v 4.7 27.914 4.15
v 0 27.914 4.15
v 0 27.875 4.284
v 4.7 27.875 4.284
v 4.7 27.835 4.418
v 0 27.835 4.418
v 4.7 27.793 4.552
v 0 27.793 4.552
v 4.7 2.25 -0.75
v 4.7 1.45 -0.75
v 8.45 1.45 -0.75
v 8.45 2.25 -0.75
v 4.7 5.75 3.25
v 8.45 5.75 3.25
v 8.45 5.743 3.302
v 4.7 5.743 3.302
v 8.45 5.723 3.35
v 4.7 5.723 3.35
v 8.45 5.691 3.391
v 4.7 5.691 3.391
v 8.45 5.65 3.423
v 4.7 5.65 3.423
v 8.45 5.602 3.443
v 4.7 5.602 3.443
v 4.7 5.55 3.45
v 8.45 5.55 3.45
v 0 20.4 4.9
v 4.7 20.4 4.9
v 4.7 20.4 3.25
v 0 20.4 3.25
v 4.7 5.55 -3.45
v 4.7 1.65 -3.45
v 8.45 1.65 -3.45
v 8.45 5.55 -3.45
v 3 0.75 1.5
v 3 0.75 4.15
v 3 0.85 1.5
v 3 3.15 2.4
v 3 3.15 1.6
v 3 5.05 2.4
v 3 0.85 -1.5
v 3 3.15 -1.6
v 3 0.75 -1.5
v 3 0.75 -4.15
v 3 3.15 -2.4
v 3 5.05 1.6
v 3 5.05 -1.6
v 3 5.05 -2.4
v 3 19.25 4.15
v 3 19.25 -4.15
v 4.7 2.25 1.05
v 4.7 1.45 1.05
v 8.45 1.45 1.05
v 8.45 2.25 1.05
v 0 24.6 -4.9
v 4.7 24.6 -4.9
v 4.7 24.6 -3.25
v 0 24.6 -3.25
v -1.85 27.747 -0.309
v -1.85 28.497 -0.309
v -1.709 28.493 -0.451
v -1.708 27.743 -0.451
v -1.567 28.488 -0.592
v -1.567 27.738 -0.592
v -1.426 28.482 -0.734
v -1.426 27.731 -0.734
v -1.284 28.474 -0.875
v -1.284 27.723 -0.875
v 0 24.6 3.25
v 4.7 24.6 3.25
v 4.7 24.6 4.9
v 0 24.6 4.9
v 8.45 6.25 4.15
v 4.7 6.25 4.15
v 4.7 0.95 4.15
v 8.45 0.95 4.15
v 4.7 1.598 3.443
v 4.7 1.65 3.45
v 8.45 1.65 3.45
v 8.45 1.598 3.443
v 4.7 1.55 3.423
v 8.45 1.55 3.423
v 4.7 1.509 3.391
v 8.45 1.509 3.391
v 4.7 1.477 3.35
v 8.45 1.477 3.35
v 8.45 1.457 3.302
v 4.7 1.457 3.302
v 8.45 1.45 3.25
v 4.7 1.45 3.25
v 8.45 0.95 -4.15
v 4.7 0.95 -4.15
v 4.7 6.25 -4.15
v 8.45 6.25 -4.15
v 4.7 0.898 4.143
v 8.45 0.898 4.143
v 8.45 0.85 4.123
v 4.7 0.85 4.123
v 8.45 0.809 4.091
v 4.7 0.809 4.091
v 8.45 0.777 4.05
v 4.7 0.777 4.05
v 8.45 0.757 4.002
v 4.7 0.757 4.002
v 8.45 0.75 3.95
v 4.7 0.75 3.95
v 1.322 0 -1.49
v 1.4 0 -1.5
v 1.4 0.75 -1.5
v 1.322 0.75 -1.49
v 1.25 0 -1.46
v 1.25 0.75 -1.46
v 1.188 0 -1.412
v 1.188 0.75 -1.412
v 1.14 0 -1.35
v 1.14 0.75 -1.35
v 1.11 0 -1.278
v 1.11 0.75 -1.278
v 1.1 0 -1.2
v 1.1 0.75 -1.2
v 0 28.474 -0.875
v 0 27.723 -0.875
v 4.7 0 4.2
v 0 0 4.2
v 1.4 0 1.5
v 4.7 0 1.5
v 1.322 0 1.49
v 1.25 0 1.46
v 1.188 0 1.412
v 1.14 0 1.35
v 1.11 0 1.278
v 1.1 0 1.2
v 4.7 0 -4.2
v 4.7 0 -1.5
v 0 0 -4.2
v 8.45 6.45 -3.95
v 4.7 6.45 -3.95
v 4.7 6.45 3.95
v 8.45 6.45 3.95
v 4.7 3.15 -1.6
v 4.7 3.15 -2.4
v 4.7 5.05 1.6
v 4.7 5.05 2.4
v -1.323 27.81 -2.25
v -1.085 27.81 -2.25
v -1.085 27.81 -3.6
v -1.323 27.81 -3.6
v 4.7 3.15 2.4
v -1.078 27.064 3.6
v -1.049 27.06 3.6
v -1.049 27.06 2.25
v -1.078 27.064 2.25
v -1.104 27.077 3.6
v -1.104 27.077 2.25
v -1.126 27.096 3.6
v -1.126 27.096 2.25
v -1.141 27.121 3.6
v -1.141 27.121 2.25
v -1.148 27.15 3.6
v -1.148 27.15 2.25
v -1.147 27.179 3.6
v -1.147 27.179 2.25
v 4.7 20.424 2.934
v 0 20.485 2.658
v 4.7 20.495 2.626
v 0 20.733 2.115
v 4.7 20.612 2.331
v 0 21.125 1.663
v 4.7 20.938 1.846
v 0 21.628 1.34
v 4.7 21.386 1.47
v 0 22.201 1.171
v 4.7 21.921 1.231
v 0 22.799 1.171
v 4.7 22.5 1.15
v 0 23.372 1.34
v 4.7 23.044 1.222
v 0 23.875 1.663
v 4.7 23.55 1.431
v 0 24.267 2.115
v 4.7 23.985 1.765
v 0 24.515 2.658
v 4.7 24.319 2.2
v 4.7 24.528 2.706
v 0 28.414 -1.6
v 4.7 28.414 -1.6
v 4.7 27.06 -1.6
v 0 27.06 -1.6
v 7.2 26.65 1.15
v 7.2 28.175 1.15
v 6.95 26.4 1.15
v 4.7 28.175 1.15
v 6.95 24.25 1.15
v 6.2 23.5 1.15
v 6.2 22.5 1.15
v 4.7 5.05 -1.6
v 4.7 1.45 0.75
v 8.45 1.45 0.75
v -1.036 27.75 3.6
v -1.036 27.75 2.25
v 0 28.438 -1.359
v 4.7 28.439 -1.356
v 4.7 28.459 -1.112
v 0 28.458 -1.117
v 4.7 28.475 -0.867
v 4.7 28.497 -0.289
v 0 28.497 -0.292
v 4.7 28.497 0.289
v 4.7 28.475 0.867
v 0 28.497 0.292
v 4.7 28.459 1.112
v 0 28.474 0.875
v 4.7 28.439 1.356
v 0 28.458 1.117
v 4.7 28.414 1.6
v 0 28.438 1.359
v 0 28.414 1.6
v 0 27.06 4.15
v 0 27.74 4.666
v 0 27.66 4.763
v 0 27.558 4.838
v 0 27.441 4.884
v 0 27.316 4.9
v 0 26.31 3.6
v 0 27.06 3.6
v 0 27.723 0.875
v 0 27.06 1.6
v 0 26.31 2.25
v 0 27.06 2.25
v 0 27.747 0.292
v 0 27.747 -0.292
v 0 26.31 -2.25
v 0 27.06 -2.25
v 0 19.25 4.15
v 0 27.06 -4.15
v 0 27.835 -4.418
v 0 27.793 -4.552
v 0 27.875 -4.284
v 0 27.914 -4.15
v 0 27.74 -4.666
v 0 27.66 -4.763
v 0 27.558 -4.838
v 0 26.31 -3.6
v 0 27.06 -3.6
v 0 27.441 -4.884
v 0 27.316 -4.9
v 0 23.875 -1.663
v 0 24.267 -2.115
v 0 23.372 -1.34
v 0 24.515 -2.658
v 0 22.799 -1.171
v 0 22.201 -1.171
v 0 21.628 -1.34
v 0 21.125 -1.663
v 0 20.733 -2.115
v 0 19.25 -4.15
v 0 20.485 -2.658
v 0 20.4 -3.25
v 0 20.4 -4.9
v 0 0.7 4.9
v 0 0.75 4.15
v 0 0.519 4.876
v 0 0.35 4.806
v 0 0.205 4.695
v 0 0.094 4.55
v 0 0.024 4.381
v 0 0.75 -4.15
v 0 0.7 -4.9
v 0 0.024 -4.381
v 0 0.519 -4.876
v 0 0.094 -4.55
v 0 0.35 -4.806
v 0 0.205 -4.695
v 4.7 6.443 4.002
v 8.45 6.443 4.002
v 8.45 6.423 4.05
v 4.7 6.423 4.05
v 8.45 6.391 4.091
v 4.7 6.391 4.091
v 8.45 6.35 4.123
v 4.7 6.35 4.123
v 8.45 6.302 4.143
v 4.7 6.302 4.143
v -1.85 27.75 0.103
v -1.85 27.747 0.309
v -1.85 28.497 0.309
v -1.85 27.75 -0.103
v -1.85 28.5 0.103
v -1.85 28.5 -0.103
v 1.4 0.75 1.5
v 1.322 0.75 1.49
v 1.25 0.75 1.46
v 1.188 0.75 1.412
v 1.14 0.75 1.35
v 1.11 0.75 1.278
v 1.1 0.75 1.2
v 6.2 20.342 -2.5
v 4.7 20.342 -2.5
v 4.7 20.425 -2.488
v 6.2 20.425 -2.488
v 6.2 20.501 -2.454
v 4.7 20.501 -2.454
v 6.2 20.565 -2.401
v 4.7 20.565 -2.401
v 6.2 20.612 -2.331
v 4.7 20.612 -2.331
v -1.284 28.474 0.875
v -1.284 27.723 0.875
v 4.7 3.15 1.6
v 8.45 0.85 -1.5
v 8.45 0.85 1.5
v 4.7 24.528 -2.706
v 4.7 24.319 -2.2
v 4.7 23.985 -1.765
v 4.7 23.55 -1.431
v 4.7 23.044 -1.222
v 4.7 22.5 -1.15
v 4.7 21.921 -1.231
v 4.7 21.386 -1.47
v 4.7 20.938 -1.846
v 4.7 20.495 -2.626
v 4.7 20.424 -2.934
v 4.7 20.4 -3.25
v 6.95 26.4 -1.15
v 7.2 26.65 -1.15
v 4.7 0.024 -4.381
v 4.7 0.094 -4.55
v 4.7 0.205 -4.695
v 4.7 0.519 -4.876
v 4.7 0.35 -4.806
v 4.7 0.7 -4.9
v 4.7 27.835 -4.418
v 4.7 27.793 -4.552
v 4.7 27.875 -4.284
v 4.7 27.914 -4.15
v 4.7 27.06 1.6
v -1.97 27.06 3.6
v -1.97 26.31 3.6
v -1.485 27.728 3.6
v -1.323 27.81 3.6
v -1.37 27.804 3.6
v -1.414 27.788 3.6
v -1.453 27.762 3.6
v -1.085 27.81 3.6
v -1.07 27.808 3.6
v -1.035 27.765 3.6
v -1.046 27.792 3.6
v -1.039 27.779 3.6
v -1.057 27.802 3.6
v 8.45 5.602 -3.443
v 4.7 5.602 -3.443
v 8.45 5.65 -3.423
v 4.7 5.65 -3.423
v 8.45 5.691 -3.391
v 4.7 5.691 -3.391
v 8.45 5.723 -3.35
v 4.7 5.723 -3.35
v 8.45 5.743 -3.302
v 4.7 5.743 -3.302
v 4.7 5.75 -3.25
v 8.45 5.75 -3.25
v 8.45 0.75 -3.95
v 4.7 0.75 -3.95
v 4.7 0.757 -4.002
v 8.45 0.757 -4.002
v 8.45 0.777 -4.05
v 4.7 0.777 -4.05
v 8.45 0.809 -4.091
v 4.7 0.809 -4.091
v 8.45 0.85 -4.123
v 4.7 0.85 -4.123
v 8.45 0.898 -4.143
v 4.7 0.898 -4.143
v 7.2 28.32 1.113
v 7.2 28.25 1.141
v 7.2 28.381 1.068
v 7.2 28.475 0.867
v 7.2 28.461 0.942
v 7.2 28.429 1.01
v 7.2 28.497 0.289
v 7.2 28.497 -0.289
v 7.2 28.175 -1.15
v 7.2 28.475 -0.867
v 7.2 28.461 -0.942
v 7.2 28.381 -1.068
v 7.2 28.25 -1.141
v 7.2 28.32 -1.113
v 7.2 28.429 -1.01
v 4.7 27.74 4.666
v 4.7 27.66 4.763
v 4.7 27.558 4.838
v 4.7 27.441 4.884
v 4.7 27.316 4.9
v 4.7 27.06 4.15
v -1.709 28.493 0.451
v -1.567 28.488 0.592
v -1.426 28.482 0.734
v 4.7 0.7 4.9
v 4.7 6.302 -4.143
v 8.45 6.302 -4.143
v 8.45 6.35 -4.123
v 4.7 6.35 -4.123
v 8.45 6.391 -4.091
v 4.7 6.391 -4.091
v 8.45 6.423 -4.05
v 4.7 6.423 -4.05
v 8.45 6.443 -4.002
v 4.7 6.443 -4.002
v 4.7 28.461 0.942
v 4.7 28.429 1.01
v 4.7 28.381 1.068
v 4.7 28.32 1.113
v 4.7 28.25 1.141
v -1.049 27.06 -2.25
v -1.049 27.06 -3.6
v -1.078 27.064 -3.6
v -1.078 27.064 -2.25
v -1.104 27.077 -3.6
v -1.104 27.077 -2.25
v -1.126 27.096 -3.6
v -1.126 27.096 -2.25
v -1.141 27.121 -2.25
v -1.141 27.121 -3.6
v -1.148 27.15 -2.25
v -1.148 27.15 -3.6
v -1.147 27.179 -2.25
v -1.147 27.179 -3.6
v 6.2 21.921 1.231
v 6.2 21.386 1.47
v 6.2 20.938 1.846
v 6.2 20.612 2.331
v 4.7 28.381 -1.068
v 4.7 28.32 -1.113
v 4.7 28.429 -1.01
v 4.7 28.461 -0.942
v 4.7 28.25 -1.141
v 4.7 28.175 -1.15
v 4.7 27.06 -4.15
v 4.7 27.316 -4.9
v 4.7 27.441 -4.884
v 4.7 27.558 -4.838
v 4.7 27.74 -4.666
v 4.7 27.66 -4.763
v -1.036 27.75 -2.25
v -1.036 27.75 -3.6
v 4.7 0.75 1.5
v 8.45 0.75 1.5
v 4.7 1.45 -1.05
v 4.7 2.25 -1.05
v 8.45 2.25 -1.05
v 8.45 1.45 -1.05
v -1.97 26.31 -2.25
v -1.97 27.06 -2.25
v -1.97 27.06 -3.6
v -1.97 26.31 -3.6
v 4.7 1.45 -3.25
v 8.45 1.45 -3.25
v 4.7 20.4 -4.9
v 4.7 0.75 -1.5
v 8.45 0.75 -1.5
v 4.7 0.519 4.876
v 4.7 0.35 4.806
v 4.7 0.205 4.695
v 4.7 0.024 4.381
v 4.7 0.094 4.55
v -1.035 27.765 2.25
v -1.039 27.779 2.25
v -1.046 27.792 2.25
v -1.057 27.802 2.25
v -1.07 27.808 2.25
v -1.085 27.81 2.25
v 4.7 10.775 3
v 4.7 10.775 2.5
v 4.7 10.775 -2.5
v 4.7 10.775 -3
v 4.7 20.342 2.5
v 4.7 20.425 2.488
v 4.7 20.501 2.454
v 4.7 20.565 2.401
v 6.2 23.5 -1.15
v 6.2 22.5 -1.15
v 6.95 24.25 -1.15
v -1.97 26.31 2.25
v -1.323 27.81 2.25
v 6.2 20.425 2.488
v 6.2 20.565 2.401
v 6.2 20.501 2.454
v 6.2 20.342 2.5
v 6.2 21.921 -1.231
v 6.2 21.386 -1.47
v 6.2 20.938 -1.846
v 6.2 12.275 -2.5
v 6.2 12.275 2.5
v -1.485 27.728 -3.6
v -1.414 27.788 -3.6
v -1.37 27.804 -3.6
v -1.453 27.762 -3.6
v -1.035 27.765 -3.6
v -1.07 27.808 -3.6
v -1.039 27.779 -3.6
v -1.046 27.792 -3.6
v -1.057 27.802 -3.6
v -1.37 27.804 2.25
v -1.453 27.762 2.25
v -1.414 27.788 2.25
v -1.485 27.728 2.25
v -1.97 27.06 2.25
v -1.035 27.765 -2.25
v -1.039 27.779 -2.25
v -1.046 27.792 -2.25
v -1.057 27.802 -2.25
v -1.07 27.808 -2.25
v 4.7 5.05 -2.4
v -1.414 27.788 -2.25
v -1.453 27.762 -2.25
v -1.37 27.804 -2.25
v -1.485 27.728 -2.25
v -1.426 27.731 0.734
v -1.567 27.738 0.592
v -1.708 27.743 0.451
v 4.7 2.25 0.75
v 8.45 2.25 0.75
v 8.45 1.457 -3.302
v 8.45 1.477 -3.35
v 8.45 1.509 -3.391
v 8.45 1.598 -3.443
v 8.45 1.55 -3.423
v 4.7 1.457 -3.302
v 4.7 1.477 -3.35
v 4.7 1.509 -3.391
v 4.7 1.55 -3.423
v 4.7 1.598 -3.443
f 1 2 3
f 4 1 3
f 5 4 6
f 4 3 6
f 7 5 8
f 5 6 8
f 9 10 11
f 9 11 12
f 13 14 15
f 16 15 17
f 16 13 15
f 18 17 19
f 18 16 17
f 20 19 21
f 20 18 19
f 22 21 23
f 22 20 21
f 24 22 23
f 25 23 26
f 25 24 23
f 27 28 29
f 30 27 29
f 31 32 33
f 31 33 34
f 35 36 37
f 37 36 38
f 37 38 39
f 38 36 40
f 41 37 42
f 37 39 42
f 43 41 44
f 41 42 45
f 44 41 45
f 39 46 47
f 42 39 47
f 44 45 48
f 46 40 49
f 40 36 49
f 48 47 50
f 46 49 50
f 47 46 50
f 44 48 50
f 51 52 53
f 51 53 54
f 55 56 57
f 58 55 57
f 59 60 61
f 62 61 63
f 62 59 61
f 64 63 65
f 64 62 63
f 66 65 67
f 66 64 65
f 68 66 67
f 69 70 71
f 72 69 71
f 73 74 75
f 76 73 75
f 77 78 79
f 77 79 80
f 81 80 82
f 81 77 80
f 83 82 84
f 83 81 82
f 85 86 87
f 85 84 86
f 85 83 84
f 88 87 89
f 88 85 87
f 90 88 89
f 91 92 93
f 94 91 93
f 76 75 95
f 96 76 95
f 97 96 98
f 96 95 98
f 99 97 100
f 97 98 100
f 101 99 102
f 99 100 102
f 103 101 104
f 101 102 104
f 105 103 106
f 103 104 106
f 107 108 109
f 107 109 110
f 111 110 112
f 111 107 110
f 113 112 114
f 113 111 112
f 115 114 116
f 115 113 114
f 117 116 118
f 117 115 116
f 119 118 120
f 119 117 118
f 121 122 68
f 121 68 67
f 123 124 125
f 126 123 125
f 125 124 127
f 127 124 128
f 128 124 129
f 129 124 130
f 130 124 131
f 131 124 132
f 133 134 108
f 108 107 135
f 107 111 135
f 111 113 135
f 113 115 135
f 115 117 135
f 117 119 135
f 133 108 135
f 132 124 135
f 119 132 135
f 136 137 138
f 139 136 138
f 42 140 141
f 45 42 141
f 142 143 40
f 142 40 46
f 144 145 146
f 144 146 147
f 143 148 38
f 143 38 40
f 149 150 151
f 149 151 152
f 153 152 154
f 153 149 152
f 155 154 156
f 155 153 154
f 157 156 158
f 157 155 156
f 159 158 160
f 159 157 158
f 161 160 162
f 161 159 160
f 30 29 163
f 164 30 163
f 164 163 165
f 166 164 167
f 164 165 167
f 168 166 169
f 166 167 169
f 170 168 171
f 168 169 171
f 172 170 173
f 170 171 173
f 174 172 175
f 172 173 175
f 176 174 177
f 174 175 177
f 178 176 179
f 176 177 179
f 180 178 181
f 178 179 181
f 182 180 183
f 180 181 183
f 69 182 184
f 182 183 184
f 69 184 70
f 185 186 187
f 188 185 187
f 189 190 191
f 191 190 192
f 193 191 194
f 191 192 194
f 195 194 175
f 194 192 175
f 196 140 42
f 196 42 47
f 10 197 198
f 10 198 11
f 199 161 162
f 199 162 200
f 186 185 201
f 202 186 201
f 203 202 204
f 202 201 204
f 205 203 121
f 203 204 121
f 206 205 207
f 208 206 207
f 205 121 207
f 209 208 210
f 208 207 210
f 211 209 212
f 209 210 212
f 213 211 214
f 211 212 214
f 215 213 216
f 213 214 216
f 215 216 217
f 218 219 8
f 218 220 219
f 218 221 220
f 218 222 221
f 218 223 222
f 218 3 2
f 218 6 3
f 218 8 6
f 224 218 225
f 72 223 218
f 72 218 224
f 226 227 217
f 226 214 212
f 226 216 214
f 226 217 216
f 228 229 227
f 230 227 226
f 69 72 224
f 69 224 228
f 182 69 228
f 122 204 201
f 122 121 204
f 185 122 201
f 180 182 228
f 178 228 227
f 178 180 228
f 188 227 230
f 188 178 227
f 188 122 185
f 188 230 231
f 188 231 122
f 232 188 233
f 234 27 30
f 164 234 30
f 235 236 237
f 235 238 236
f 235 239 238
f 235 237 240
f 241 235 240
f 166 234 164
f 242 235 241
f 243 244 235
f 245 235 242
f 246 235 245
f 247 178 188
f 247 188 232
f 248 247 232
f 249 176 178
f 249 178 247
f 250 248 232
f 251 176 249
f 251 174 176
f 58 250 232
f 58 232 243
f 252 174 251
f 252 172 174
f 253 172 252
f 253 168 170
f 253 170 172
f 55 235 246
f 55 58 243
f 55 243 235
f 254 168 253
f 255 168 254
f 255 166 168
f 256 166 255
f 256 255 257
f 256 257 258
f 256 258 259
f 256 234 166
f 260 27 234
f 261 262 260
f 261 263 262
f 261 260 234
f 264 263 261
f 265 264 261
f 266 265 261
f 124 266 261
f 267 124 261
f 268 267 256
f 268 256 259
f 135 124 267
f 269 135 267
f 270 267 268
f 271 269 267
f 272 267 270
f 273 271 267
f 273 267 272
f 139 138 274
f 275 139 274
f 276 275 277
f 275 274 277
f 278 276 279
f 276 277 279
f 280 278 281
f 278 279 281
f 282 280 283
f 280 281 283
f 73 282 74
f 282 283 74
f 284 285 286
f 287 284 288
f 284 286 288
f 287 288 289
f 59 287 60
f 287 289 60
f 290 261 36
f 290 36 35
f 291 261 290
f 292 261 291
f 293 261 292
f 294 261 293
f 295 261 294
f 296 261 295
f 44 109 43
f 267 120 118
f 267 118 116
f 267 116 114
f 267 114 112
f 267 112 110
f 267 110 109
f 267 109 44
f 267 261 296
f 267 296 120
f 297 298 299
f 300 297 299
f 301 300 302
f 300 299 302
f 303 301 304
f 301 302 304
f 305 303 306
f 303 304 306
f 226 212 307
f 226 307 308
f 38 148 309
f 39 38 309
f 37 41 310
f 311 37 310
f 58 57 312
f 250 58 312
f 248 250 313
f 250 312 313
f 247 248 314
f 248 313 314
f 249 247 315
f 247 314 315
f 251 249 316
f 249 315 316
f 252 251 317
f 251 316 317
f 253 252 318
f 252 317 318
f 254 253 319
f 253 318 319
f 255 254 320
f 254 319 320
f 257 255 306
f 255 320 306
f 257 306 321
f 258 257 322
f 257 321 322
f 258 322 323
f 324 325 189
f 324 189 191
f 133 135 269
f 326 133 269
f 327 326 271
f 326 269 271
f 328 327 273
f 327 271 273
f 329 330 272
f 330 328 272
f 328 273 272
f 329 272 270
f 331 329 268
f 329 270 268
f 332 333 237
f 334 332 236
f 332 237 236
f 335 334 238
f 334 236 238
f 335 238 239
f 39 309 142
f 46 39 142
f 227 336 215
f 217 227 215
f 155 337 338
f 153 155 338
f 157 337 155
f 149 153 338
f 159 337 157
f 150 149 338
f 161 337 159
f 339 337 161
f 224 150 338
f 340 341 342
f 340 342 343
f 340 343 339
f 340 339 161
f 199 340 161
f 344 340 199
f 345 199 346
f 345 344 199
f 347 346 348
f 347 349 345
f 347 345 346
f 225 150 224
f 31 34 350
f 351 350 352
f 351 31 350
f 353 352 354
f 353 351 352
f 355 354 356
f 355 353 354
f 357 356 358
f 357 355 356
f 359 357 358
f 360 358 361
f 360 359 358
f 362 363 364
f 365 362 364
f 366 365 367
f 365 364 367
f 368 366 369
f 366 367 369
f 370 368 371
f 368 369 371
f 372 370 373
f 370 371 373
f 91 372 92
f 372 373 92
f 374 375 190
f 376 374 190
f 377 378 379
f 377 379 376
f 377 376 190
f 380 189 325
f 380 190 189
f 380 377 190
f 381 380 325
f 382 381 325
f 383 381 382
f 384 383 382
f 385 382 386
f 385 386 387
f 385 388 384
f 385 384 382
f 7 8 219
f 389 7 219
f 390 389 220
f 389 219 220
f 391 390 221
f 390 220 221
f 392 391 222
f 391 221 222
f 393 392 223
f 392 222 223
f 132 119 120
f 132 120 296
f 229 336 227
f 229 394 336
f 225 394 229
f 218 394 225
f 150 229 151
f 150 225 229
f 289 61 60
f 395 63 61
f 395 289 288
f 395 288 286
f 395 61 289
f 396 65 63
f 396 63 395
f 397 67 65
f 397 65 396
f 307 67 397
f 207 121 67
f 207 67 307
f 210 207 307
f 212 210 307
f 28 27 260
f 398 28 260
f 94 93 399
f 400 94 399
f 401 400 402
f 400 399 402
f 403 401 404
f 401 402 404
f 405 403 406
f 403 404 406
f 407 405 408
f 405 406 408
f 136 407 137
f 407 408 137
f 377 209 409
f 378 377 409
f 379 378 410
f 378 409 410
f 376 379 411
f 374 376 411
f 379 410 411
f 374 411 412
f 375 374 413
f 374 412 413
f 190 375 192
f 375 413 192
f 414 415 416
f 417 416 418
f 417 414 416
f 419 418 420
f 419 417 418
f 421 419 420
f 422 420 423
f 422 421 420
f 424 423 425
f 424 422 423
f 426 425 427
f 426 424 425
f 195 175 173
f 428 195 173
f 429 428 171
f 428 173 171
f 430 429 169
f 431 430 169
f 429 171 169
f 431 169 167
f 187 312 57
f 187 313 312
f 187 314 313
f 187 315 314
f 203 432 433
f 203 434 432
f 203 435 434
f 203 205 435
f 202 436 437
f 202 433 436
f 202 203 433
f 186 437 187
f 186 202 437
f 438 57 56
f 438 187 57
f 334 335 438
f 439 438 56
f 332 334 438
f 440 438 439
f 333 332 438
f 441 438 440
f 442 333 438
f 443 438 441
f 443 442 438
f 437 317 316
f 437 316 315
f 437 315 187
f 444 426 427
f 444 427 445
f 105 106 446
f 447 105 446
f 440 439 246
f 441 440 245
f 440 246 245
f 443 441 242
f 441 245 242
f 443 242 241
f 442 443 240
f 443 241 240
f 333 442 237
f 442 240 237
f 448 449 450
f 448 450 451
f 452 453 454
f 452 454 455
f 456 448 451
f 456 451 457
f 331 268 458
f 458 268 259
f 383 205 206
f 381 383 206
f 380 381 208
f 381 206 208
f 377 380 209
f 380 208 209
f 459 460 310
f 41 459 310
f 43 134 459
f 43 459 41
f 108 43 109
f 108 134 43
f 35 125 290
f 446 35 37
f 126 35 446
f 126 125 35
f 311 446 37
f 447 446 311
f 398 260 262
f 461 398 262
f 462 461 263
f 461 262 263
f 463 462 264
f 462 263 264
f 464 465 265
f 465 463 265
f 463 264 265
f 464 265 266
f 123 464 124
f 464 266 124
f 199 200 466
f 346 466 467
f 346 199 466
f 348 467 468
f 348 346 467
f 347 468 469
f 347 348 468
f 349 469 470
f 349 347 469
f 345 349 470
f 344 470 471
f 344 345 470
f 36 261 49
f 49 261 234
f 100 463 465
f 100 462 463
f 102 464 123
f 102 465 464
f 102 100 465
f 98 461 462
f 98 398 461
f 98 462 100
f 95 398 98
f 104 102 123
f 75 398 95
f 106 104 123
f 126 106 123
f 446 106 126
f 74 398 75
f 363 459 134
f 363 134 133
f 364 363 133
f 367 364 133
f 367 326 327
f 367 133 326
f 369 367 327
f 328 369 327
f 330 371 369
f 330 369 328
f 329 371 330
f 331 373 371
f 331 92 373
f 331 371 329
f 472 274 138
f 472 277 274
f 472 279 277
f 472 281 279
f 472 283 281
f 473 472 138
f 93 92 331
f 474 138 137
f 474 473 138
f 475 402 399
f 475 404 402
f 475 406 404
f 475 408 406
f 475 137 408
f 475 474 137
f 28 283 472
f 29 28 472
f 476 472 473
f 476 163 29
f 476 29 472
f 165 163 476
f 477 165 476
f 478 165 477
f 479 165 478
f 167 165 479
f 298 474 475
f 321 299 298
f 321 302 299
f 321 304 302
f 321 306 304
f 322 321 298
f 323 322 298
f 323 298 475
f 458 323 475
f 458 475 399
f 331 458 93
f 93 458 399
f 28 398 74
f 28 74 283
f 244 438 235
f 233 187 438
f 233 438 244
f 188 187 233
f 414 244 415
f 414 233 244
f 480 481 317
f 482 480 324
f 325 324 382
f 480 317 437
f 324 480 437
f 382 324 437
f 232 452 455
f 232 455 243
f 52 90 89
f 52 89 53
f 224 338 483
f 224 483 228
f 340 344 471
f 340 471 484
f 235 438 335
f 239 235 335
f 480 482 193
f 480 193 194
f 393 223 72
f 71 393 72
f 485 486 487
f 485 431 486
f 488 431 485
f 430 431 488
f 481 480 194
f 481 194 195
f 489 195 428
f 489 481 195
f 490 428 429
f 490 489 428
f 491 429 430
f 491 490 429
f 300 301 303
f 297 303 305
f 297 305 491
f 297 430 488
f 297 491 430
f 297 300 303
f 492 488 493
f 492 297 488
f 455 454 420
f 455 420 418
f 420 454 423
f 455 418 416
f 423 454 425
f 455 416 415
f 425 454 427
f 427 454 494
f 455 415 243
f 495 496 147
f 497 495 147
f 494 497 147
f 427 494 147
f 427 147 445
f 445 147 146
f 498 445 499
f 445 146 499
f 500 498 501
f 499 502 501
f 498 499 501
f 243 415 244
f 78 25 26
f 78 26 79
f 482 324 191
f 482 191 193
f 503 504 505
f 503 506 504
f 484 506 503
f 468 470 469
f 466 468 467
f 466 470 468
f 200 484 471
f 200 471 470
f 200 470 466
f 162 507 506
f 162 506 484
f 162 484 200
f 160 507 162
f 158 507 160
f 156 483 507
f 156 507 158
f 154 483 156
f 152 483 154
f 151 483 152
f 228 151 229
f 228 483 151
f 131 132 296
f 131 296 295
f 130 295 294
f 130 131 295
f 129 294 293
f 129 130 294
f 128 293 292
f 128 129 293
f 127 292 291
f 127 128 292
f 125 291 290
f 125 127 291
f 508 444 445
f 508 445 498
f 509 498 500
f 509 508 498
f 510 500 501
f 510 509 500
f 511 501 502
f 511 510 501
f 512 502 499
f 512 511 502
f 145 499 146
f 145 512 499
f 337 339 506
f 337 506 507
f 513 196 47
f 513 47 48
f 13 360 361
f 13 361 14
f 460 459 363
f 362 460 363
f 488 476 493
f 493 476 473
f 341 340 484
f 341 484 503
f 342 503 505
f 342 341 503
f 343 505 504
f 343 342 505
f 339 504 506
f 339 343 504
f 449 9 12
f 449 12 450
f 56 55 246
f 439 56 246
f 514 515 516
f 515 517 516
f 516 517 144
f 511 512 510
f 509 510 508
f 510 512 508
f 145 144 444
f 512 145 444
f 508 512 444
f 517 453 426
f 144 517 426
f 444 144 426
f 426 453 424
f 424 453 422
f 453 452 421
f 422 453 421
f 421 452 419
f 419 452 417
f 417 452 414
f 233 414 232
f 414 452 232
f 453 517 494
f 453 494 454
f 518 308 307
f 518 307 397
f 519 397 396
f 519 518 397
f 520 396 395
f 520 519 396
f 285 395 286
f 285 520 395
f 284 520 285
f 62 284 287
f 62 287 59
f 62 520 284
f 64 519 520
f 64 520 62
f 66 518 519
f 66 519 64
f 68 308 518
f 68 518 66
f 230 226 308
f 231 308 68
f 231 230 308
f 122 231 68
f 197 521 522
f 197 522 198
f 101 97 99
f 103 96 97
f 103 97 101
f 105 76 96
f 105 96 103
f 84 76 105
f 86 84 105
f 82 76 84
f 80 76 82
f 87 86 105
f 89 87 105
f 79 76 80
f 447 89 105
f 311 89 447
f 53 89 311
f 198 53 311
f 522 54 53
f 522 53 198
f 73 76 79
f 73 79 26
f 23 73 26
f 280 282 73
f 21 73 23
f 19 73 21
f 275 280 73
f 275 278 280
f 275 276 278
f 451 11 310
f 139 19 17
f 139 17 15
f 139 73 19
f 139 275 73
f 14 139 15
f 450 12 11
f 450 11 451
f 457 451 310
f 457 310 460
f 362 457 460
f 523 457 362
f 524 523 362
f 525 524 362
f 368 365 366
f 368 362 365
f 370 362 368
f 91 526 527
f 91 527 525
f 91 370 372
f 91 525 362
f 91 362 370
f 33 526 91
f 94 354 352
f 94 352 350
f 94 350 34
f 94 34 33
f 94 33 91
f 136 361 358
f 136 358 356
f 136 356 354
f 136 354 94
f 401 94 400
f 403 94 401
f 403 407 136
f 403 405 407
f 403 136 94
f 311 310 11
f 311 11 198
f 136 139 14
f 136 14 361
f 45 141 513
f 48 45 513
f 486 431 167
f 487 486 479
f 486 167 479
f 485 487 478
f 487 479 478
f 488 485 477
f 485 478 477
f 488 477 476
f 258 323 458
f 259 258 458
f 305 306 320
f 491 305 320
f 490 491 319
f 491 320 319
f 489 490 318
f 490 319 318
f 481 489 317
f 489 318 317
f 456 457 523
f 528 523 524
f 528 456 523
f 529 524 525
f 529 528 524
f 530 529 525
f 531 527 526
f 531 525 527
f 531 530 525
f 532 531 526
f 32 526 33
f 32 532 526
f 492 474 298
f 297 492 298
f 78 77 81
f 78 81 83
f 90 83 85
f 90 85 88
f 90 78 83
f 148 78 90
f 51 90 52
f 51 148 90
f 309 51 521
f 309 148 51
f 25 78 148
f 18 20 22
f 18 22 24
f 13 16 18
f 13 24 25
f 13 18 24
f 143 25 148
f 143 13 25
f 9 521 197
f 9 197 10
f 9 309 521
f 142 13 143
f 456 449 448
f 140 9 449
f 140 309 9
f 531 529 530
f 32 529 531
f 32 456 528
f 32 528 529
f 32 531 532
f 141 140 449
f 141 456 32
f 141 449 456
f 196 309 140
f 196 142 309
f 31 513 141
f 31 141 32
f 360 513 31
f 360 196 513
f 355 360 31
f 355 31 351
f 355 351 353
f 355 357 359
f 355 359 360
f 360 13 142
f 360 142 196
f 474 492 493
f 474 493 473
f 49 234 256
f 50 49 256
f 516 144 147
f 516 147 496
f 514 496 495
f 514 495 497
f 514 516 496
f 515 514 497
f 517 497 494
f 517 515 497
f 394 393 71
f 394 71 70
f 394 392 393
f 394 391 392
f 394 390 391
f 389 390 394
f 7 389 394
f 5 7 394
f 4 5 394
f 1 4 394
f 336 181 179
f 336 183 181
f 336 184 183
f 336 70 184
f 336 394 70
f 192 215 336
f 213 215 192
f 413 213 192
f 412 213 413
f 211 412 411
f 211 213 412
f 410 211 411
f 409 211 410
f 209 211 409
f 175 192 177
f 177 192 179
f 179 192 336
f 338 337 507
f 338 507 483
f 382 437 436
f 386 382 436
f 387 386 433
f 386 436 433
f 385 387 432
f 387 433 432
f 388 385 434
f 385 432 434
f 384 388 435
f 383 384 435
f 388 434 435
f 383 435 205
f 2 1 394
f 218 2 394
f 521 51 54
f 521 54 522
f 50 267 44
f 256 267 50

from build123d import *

# Parameters (mm, degrees)
BOSS_EXTRUDE1_DEPTH      = 8.45
SKETCH2_W                = 12
SKETCH2_H                = 30
CUT_EXTRUDE1_DEPTH       = 8.45
CUT_EXTRUDE2_DEPTH       = 8.45
SKETCH4_W                = 0.8
SKETCH4_H                = 1.9
CUT_EXTRUDE3_DEPTH       = 8.45
SKETCH5_W                = 0.8
SKETCH5_H                = 1.9
CUT_EXTRUDE4_DEPTH       = 8.45
BOSS_EXTRUDE2_DEPTH      = 2.5
CUT_EXTRUDE5_DEPTH       = 3
CUT_EXTRUDE5_DEPTH_BACK  = 3
CUT_EXTRUDE6_DEPTH       = 5
CUT_EXTRUDE6_DEPTH_BACK  = 5
SKETCH9_W                = 8.3
SKETCH9_H                = 18.5
CUT_EXTRUDE7_DEPTH       = 3
BOSS_EXTRUDE3_DEPTH      = 3.6
BOSS_EXTRUDE3_DEPTH_BACK = 3.6
SKETCH11_W               = 3
SKETCH11_H               = 4.5
CUT_EXTRUDE8_DEPTH       = 30
BOSS_EXTRUDE4_START      = -1.85
BOSS_EXTRUDE4_DEPTH      = 1.85
CUT_EXTRUDE9_DEPTH       = 30
CUT_EXTRUDE10_DEPTH      = 0.85


with BuildPart() as part:
    # Sketch1 → Boss-Extrude1 (new body)
    with BuildSketch(Plane(origin=(0, 0, 0), x_dir=(0, 0, -1), z_dir=(1, 0, 0))):
        with BuildLine():
            Line((-4.2, 0), (4.2, 0))
            ThreePointArc((4.2, 0), (4.694974747, 0.205025253), (4.9, 0.7))
            Line((4.9, 0.7), (4.9, 27.316294728))
            ThreePointArc((4.9, 27.316294728), (4.803647153, 27.611369254), (4.551724095, 27.792718697))
            ThreePointArc((4.551724095, 27.792718697), (-2.2e-08, 28.5), (-4.551724138, 27.792718684))
            ThreePointArc((-4.551724138, 27.792718684), (-4.803647166, 27.611369236), (-4.9, 27.316294728))
            Line((-4.9, 27.316294728), (-4.9, 0.7))
            ThreePointArc((-4.9, 0.7), (-4.694974747, 0.205025253), (-4.2, 0))
        make_face()
    extrude(amount=BOSS_EXTRUDE1_DEPTH)

    # Sketch2 → Cut-Extrude1 (cut)
    with BuildSketch(Plane(origin=(4.7, 0, 0), x_dir=(0, 0, -1), z_dir=(1, 0, 0))):
        with Locations((0, 14)):
            Rectangle(SKETCH2_W, SKETCH2_H)
        with BuildLine():
            Line((-4.15, 6.25), (-4.15, 0.95))
            ThreePointArc((-4.15, 0.95), (-4.091421356, 0.808578644), (-3.95, 0.75))
            Line((-3.95, 0.75), (3.95, 0.75))
            ThreePointArc((3.95, 0.75), (4.091421356, 0.808578644), (4.15, 0.95))
            Line((4.15, 0.95), (4.15, 6.25))
            ThreePointArc((4.15, 6.25), (4.091421356, 6.391421356), (3.95, 6.45))
            Line((3.95, 6.45), (-3.95, 6.45))
            ThreePointArc((-3.95, 6.45), (-4.091421356, 6.391421356), (-4.15, 6.25))
        make_face(mode=Mode.SUBTRACT)
    extrude(amount=CUT_EXTRUDE1_DEPTH, mode=Mode.SUBTRACT)

    # Sketch3 → Cut-Extrude2 (cut)
    with BuildSketch(Plane(origin=(4.7, 0, 0), x_dir=(0, 0, -1), z_dir=(1, 0, 0))):
        with BuildLine():
            Line((-3.45, 5.55), (-3.45, 1.65))
            ThreePointArc((-3.45, 1.65), (-3.391421356, 1.508578644), (-3.25, 1.45))
            Line((-3.25, 1.45), (-1.05, 1.45))
            Line((-1.05, 1.45), (-1.05, 2.25))
            Line((-1.05, 2.25), (-0.75, 2.25))
            Line((-0.75, 2.25), (-0.75, 1.45))
            Line((-0.75, 1.45), (0.75, 1.45))
            Line((0.75, 1.45), (0.75, 2.25))
            Line((0.75, 2.25), (1.05, 2.25))
            Line((1.05, 2.25), (1.05, 1.45))
            Line((1.05, 1.45), (3.25, 1.45))
            ThreePointArc((3.25, 1.45), (3.391421356, 1.508578644), (3.45, 1.65))
            Line((3.45, 1.65), (3.45, 5.55))
            ThreePointArc((3.45, 5.55), (3.391421356, 5.691421356), (3.25, 5.75))
            Line((3.25, 5.75), (-3.25, 5.75))
            ThreePointArc((-3.25, 5.75), (-3.391421356, 5.691421356), (-3.45, 5.55))
        make_face()
    extrude(amount=CUT_EXTRUDE2_DEPTH, mode=Mode.SUBTRACT)

    # Sketch4 → Cut-Extrude3 (cut)
    with BuildSketch(Plane(origin=(4.7, 0, 0), x_dir=(0, 0, -1), z_dir=(1, 0, 0))):
        with Locations((2, 4.1)):
            Rectangle(SKETCH4_W, SKETCH4_H)
    extrude(amount=-CUT_EXTRUDE3_DEPTH, mode=Mode.SUBTRACT)

    # Sketch5 → Cut-Extrude4 (cut)
    with BuildSketch(Plane(origin=(4.7, 0, 0), x_dir=(0, 0, -1), z_dir=(1, 0, 0))):
        with Locations((-2, 4.1)):
            Rectangle(SKETCH5_W, SKETCH5_H)
    extrude(amount=-CUT_EXTRUDE4_DEPTH, mode=Mode.SUBTRACT)

    # Sketch6 → Boss-Extrude2 (add)
    with BuildSketch(Plane(origin=(4.7, 0, 0), x_dir=(0, 0, -1), z_dir=(1, 0, 0))):
        with BuildLine():
            Line((-2.5, 20.341875815), (-2.5, 10.775))
            Line((-2.5, 10.775), (2.5, 10.775))
            Line((2.5, 10.775), (2.5, 20.341875815))
            ThreePointArc((2.5, 20.341875815), (2.454337374, 20.50097484), (2.33125, 20.611641338))
            ThreePointArc((2.33125, 20.611641338), (1.469638379, 21.38630682), (1.15, 22.5))
            Line((1.15, 22.5), (1.15, 28.175404594))
            ThreePointArc((1.15, 28.175404594), (1.068178929, 28.381312231), (0.867346966, 28.474902645))
            ThreePointArc((0.867346966, 28.474902645), (1.4e-08, 28.5), (-0.867346939, 28.474902647))
            ThreePointArc((-0.867346939, 28.474902647), (-1.068178919, 28.381312241), (-1.15, 28.175404594))
            Line((-1.15, 28.175404594), (-1.15, 22.5))
            ThreePointArc((-1.15, 22.5), (-1.469638379, 21.38630682), (-2.33125, 20.611641338))
            ThreePointArc((-2.33125, 20.611641338), (-2.454337374, 20.50097484), (-2.5, 20.341875815))
        make_face()
    extrude(amount=BOSS_EXTRUDE2_DEPTH)

    # Sketch7 → Cut-Extrude5 (cut, two sides: drawn at the far end of the back side and taken through both)
    with BuildSketch(Plane.XY.offset(-CUT_EXTRUDE5_DEPTH_BACK)):
        Polygon((4.7, 10.775), (12.2, 10.775), (12.2, 30.775), (7.2, 30.775), (7.2, 26.65), (6.95, 26.4), (6.95, 24.25), (6.2, 23.5), (6.2, 12.275), align=None)
    extrude(amount=CUT_EXTRUDE5_DEPTH + CUT_EXTRUDE5_DEPTH_BACK, mode=Mode.SUBTRACT)

    # Sketch8 → Cut-Extrude6 (cut, two sides: drawn at the far end of the back side and taken through both)
    with BuildSketch(Plane(origin=(4.7, 0, 0), x_dir=(0, 0, -1), z_dir=(1, 0, 0)).offset(-CUT_EXTRUDE6_DEPTH_BACK)):
        with BuildLine():
            Line((-7, 20.4), (-3.25, 20.4))
            ThreePointArc((-3.25, 20.4), (-1.15, 22.5), (-3.25, 24.6))
            Line((-3.25, 24.6), (-6, 24.6))
            Line((-6, 24.6), (-6, 30.06))
            Line((-6, 30.06), (-4.15, 30.06))
            Line((-4.15, 30.06), (-4.15, 27.06))
            Line((-4.15, 27.06), (-1.6, 27.06))
            Line((-1.6, 27.06), (-1.6, 29.06))
            Line((-1.6, 29.06), (1.6, 29.06))
            Line((1.6, 29.06), (1.6, 27.06))
            Line((1.6, 27.06), (4.15, 27.06))
            Line((4.15, 27.06), (4.15, 30.06))
            Line((4.15, 30.06), (6, 30.06))
            Line((6, 30.06), (6, 24.6))
            Line((6, 24.6), (3.25, 24.6))
            ThreePointArc((3.25, 24.6), (1.15, 22.5), (3.25, 20.4))
            Line((3.25, 20.4), (7, 20.4))
            Line((7, 20.4), (7, 31.06))
            Line((7, 31.06), (-7, 31.06))
            Line((-7, 31.06), (-7, 20.4))
        make_face()
    extrude(amount=CUT_EXTRUDE6_DEPTH + CUT_EXTRUDE6_DEPTH_BACK, mode=Mode.SUBTRACT)

    # Sketch9 → Cut-Extrude7 (cut)
    with BuildSketch(Plane(origin=(0, 0, 0), x_dir=(0, 0, -1), z_dir=(1, 0, 0))):
        with Locations((0, 10)):
            Rectangle(SKETCH9_W, SKETCH9_H)
    extrude(amount=CUT_EXTRUDE7_DEPTH, mode=Mode.SUBTRACT)

    # Sketch10 → Boss-Extrude3 (add, two sides: drawn at the far end of the back side and taken through both)
    with BuildSketch(Plane.XY.offset(-BOSS_EXTRUDE3_DEPTH_BACK)):
        with BuildLine():
            Line((-1.97, 27.06), (-1.97, 26.31))
            Line((-1.97, 26.31), (0, 26.31))
            Line((0, 26.31), (0, 27.06))
            Line((0, 27.06), (-1.0486903, 27.06))
            ThreePointArc((-1.0486903, 27.06), (-1.125852758, 27.096392178), (-1.146853018, 27.1790809))
            Line((-1.146853018, 27.1790809), (-1.035788259, 27.75045955))
            ThreePointArc((-1.035788259, 27.75045955), (-1.046288389, 27.791803911), (-1.084869618, 27.81))
            Line((-1.084869618, 27.81), (-1.323188014, 27.81))
            ThreePointArc((-1.323188014, 27.81), (-1.413986114, 27.788201305), (-1.484991413, 27.72755705))
            Line((-1.484991413, 27.72755705), (-1.97, 27.06))
        make_face()
    extrude(amount=BOSS_EXTRUDE3_DEPTH + BOSS_EXTRUDE3_DEPTH_BACK)

    # Sketch11 → Cut-Extrude8 (cut)
    with BuildSketch(Plane(origin=(0, 0, 0), x_dir=(1, 0, 0), z_dir=(0, 1, 0))):
        with Locations((-1.5, 0)):
            Rectangle(SKETCH11_W, SKETCH11_H)
    extrude(amount=CUT_EXTRUDE8_DEPTH, mode=Mode.SUBTRACT)

    # Sketch12 → Boss-Extrude4 (add)
    with BuildSketch(Plane(origin=(0, 0, 0), x_dir=(0, 0, -1), z_dir=(1, 0, 0)).offset(BOSS_EXTRUDE4_START)):
        with BuildLine():
            Line((-0.875, 28.474457419), (-0.875, 27.723110595))
            ThreePointArc((-0.875, 27.723110595), (0, 27.75), (0.875, 27.723110595))
            Line((0.875, 27.723110595), (0.875, 28.474457419))
            ThreePointArc((0.875, 28.474457419), (0, 28.5), (-0.875, 28.474457419))
        make_face()
    extrude(amount=BOSS_EXTRUDE4_DEPTH)

    # Sketch13 → Cut-Extrude9 (cut)
    with BuildSketch(Plane(origin=(0, 0, 0), x_dir=(1, 0, 0), z_dir=(0, 1, 0))):
        Polygon((-3.85, -0.875), (-1.284314575, -0.875), (-1.85, -0.309314575), (-1.85, 0.309314575), (-1.284314575, 0.875), (-3.85, 0.875), align=None)
    extrude(amount=CUT_EXTRUDE9_DEPTH, mode=Mode.SUBTRACT)

    # Sketch14 → Cut-Extrude10 (cut)
    with BuildSketch(Plane(origin=(0, 0, 0), x_dir=(1, 0, 0), z_dir=(0, 1, 0))):
        with BuildLine():
            Line((1.1, 1.2), (1.1, -1.2))
            ThreePointArc((1.1, -1.2), (1.187867966, -1.412132034), (1.4, -1.5))
            Line((1.4, -1.5), (9.1, -1.5))
            Line((9.1, -1.5), (9.1, 1.5))
            Line((9.1, 1.5), (1.4, 1.5))
            ThreePointArc((1.4, 1.5), (1.187867966, 1.412132034), (1.1, 1.2))
        make_face()
    extrude(amount=CUT_EXTRUDE10_DEPTH, mode=Mode.SUBTRACT)


solid = part.part
